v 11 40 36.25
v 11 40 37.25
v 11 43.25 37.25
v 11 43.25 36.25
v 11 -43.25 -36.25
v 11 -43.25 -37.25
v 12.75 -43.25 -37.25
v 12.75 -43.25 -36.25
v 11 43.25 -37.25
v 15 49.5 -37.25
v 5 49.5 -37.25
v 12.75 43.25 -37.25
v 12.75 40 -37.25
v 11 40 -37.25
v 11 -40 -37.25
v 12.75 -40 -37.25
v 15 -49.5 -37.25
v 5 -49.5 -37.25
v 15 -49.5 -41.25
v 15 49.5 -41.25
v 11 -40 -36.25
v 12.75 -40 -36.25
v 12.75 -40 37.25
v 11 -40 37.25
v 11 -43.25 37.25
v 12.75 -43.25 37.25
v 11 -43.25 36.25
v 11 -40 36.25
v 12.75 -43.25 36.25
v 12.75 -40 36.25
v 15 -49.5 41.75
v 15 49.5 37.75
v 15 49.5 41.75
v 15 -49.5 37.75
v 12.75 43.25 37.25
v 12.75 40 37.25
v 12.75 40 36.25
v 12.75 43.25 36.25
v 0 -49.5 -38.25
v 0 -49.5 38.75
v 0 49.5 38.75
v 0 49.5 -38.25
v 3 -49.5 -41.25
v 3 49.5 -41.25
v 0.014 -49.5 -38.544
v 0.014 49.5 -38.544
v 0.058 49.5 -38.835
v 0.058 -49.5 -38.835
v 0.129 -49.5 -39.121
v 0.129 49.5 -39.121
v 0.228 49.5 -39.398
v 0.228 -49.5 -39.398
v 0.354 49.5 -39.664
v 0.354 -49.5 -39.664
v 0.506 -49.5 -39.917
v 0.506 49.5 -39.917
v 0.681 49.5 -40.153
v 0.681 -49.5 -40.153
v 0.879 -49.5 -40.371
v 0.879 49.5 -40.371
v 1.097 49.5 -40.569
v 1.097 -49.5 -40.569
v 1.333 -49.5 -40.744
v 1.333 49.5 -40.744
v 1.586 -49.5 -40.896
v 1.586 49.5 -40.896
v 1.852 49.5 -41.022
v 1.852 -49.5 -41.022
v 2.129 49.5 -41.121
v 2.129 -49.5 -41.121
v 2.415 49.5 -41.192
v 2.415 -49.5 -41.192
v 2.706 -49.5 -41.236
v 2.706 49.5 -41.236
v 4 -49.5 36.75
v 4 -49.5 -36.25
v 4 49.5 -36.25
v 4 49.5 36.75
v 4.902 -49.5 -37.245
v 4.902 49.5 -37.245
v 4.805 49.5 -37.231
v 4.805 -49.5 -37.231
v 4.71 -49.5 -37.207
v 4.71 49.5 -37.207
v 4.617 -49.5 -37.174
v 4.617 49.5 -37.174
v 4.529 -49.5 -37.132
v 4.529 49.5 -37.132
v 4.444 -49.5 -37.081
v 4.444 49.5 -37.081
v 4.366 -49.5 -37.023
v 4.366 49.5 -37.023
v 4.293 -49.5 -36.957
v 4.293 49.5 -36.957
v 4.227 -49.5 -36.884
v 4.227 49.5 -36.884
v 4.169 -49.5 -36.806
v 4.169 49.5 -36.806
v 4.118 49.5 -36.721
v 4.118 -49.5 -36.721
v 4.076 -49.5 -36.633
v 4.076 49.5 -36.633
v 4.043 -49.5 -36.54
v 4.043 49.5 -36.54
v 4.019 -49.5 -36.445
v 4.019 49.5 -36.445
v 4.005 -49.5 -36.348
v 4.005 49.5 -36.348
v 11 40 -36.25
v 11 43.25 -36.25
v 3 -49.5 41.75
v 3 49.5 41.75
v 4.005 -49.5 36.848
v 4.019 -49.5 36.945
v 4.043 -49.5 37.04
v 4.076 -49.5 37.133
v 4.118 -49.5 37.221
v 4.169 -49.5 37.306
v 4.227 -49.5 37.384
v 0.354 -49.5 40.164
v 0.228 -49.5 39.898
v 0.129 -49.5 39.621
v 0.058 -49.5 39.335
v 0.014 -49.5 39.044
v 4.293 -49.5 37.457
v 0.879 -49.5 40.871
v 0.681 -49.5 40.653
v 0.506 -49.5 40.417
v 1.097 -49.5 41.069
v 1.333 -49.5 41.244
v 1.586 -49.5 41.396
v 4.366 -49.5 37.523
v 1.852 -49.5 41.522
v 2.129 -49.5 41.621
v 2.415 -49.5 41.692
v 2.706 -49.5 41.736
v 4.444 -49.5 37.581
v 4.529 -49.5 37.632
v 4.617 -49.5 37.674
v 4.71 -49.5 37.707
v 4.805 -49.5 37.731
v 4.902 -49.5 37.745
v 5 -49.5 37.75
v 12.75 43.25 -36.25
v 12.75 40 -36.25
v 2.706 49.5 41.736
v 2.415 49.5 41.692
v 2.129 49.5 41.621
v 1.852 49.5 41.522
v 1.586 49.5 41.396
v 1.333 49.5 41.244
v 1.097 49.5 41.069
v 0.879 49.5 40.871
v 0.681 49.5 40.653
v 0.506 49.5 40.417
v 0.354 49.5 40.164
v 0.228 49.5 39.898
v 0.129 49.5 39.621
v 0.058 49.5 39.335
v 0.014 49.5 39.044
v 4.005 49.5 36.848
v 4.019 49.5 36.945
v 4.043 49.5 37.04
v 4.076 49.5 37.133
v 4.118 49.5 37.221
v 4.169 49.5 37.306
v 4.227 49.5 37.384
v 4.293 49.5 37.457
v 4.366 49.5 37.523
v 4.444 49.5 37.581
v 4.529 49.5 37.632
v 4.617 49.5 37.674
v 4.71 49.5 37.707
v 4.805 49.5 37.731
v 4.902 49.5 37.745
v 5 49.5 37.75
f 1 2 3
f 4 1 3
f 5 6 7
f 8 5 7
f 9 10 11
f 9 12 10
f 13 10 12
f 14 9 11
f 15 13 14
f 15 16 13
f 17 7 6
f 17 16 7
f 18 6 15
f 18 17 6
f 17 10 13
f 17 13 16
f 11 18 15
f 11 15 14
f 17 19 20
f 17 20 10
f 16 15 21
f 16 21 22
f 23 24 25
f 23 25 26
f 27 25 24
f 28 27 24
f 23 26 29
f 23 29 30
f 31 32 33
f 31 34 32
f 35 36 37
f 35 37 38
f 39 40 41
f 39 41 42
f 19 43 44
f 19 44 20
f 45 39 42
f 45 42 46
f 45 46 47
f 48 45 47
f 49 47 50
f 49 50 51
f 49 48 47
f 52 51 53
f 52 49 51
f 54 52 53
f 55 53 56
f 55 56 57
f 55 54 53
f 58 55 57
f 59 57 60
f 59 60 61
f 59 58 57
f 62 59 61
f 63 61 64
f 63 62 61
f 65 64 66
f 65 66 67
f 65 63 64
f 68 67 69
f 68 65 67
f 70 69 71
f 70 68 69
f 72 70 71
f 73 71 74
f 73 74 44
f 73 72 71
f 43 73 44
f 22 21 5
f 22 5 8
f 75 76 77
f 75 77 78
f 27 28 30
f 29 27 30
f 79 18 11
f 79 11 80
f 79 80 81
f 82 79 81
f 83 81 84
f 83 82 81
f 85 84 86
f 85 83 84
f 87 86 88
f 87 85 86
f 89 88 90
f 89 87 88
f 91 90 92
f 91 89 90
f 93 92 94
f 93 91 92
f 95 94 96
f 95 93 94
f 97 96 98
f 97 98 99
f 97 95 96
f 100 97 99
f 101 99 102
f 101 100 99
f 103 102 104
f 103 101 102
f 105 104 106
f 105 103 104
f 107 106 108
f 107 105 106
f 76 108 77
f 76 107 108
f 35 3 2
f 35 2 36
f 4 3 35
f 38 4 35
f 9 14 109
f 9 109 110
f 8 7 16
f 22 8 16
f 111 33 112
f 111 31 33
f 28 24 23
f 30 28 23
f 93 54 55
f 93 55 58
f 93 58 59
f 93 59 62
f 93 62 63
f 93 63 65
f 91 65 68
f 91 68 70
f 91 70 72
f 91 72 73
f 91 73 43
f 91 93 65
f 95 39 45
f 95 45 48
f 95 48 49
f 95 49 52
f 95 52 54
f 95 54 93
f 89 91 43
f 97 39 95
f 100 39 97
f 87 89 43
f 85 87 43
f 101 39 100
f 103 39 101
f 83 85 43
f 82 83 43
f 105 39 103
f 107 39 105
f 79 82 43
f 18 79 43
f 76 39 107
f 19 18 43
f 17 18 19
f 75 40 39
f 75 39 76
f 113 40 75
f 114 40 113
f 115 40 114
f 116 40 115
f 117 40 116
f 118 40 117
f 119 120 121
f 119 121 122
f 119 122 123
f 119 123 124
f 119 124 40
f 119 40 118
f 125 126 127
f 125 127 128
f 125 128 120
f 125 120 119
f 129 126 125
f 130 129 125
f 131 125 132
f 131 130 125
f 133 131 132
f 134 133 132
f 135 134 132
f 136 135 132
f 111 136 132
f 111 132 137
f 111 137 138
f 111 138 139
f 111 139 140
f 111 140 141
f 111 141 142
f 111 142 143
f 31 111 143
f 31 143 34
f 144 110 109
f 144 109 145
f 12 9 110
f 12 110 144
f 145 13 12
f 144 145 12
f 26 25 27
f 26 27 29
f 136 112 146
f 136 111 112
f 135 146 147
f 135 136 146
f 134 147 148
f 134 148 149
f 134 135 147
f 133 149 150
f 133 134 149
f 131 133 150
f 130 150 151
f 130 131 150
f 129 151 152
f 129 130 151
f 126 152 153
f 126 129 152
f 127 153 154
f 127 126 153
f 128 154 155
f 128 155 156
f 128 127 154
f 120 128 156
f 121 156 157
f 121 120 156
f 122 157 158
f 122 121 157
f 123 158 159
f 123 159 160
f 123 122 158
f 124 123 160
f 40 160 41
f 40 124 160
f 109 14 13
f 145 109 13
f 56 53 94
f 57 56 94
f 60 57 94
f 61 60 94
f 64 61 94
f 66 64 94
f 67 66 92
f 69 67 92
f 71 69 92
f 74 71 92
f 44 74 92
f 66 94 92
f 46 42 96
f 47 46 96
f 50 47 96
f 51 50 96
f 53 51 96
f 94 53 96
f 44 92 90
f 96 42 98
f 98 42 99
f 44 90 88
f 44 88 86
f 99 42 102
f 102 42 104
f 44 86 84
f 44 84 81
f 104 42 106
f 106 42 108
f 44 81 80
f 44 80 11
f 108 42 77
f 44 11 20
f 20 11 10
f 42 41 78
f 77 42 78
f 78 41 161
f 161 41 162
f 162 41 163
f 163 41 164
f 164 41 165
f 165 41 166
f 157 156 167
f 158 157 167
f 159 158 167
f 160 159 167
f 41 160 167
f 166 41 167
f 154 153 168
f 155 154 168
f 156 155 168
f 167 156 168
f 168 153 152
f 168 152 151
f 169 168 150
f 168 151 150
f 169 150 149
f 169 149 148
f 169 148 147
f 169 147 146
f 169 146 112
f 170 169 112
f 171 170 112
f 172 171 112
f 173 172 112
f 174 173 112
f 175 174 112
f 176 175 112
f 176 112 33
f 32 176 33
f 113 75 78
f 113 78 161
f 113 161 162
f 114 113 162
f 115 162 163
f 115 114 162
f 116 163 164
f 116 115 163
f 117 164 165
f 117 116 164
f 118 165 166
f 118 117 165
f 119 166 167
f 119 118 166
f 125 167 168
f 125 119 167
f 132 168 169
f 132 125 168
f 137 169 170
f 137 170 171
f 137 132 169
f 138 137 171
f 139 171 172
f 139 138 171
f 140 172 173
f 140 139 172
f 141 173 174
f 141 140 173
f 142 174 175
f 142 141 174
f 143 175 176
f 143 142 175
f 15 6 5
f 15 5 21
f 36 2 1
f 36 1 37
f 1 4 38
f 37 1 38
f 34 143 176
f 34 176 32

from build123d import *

# Parameters (mm, degrees)
F1_DEPTH      = 49.5
F1_DEPTH_BACK = 49.5
F2_W          = 1.75
F2_H          = 3.25
F3_DEPTH      = 1


# Not quite as in the source:
# - a pattern or mirror of a feature is missing from the dataset's text; its kind, count and spacing are read off the source's solid


with BuildPart() as f1:
    # F0 (on Front) → F1 (new body, two sides)
    with BuildSketch(Plane.XZ) as f1_sk:
        with BuildLine():
            ThreePointArc((3, 41.75), (0.8786796564, 40.8713203436), (0, 38.75))
            Line((0, 38.75), (0, -38.25))
            ThreePointArc((0, -38.25), (0.8786796564, -40.3713203436), (3, -41.25))
            Line((3, -41.25), (15, -41.25))
            Line((15, -41.25), (15, -37.25))
            Line((15, -37.25), (5, -37.25))
            ThreePointArc((5, -37.25), (4.2928932188, -36.9571067812), (4, -36.25))
            Line((4, -36.25), (4, 36.75))
            ThreePointArc((4, 36.75), (4.2928932188, 37.4571067812), (5, 37.75))
            Line((5, 37.75), (15, 37.75))
            Line((15, 37.75), (15, 41.75))
            Line((15, 41.75), (3, 41.75))
        make_face()
    extrude(amount=F1_DEPTH)
    extrude(f1_sk.sketch, amount=-F1_DEPTH_BACK)

    # F2 (on face) → F3 (join)
    with BuildSketch(Plane.XY.offset(-37.25)):
        with Locations((11.875, 41.625)):
            Rectangle(F2_W, F2_H)
        with Locations((11.875, -41.625)):
            Rectangle(F2_W, F2_H)
    f3 = extrude(amount=F3_DEPTH)

    # F3_copies: F3 across plane
    add(f3.mirror(Plane.XY))


solid = f1.part
